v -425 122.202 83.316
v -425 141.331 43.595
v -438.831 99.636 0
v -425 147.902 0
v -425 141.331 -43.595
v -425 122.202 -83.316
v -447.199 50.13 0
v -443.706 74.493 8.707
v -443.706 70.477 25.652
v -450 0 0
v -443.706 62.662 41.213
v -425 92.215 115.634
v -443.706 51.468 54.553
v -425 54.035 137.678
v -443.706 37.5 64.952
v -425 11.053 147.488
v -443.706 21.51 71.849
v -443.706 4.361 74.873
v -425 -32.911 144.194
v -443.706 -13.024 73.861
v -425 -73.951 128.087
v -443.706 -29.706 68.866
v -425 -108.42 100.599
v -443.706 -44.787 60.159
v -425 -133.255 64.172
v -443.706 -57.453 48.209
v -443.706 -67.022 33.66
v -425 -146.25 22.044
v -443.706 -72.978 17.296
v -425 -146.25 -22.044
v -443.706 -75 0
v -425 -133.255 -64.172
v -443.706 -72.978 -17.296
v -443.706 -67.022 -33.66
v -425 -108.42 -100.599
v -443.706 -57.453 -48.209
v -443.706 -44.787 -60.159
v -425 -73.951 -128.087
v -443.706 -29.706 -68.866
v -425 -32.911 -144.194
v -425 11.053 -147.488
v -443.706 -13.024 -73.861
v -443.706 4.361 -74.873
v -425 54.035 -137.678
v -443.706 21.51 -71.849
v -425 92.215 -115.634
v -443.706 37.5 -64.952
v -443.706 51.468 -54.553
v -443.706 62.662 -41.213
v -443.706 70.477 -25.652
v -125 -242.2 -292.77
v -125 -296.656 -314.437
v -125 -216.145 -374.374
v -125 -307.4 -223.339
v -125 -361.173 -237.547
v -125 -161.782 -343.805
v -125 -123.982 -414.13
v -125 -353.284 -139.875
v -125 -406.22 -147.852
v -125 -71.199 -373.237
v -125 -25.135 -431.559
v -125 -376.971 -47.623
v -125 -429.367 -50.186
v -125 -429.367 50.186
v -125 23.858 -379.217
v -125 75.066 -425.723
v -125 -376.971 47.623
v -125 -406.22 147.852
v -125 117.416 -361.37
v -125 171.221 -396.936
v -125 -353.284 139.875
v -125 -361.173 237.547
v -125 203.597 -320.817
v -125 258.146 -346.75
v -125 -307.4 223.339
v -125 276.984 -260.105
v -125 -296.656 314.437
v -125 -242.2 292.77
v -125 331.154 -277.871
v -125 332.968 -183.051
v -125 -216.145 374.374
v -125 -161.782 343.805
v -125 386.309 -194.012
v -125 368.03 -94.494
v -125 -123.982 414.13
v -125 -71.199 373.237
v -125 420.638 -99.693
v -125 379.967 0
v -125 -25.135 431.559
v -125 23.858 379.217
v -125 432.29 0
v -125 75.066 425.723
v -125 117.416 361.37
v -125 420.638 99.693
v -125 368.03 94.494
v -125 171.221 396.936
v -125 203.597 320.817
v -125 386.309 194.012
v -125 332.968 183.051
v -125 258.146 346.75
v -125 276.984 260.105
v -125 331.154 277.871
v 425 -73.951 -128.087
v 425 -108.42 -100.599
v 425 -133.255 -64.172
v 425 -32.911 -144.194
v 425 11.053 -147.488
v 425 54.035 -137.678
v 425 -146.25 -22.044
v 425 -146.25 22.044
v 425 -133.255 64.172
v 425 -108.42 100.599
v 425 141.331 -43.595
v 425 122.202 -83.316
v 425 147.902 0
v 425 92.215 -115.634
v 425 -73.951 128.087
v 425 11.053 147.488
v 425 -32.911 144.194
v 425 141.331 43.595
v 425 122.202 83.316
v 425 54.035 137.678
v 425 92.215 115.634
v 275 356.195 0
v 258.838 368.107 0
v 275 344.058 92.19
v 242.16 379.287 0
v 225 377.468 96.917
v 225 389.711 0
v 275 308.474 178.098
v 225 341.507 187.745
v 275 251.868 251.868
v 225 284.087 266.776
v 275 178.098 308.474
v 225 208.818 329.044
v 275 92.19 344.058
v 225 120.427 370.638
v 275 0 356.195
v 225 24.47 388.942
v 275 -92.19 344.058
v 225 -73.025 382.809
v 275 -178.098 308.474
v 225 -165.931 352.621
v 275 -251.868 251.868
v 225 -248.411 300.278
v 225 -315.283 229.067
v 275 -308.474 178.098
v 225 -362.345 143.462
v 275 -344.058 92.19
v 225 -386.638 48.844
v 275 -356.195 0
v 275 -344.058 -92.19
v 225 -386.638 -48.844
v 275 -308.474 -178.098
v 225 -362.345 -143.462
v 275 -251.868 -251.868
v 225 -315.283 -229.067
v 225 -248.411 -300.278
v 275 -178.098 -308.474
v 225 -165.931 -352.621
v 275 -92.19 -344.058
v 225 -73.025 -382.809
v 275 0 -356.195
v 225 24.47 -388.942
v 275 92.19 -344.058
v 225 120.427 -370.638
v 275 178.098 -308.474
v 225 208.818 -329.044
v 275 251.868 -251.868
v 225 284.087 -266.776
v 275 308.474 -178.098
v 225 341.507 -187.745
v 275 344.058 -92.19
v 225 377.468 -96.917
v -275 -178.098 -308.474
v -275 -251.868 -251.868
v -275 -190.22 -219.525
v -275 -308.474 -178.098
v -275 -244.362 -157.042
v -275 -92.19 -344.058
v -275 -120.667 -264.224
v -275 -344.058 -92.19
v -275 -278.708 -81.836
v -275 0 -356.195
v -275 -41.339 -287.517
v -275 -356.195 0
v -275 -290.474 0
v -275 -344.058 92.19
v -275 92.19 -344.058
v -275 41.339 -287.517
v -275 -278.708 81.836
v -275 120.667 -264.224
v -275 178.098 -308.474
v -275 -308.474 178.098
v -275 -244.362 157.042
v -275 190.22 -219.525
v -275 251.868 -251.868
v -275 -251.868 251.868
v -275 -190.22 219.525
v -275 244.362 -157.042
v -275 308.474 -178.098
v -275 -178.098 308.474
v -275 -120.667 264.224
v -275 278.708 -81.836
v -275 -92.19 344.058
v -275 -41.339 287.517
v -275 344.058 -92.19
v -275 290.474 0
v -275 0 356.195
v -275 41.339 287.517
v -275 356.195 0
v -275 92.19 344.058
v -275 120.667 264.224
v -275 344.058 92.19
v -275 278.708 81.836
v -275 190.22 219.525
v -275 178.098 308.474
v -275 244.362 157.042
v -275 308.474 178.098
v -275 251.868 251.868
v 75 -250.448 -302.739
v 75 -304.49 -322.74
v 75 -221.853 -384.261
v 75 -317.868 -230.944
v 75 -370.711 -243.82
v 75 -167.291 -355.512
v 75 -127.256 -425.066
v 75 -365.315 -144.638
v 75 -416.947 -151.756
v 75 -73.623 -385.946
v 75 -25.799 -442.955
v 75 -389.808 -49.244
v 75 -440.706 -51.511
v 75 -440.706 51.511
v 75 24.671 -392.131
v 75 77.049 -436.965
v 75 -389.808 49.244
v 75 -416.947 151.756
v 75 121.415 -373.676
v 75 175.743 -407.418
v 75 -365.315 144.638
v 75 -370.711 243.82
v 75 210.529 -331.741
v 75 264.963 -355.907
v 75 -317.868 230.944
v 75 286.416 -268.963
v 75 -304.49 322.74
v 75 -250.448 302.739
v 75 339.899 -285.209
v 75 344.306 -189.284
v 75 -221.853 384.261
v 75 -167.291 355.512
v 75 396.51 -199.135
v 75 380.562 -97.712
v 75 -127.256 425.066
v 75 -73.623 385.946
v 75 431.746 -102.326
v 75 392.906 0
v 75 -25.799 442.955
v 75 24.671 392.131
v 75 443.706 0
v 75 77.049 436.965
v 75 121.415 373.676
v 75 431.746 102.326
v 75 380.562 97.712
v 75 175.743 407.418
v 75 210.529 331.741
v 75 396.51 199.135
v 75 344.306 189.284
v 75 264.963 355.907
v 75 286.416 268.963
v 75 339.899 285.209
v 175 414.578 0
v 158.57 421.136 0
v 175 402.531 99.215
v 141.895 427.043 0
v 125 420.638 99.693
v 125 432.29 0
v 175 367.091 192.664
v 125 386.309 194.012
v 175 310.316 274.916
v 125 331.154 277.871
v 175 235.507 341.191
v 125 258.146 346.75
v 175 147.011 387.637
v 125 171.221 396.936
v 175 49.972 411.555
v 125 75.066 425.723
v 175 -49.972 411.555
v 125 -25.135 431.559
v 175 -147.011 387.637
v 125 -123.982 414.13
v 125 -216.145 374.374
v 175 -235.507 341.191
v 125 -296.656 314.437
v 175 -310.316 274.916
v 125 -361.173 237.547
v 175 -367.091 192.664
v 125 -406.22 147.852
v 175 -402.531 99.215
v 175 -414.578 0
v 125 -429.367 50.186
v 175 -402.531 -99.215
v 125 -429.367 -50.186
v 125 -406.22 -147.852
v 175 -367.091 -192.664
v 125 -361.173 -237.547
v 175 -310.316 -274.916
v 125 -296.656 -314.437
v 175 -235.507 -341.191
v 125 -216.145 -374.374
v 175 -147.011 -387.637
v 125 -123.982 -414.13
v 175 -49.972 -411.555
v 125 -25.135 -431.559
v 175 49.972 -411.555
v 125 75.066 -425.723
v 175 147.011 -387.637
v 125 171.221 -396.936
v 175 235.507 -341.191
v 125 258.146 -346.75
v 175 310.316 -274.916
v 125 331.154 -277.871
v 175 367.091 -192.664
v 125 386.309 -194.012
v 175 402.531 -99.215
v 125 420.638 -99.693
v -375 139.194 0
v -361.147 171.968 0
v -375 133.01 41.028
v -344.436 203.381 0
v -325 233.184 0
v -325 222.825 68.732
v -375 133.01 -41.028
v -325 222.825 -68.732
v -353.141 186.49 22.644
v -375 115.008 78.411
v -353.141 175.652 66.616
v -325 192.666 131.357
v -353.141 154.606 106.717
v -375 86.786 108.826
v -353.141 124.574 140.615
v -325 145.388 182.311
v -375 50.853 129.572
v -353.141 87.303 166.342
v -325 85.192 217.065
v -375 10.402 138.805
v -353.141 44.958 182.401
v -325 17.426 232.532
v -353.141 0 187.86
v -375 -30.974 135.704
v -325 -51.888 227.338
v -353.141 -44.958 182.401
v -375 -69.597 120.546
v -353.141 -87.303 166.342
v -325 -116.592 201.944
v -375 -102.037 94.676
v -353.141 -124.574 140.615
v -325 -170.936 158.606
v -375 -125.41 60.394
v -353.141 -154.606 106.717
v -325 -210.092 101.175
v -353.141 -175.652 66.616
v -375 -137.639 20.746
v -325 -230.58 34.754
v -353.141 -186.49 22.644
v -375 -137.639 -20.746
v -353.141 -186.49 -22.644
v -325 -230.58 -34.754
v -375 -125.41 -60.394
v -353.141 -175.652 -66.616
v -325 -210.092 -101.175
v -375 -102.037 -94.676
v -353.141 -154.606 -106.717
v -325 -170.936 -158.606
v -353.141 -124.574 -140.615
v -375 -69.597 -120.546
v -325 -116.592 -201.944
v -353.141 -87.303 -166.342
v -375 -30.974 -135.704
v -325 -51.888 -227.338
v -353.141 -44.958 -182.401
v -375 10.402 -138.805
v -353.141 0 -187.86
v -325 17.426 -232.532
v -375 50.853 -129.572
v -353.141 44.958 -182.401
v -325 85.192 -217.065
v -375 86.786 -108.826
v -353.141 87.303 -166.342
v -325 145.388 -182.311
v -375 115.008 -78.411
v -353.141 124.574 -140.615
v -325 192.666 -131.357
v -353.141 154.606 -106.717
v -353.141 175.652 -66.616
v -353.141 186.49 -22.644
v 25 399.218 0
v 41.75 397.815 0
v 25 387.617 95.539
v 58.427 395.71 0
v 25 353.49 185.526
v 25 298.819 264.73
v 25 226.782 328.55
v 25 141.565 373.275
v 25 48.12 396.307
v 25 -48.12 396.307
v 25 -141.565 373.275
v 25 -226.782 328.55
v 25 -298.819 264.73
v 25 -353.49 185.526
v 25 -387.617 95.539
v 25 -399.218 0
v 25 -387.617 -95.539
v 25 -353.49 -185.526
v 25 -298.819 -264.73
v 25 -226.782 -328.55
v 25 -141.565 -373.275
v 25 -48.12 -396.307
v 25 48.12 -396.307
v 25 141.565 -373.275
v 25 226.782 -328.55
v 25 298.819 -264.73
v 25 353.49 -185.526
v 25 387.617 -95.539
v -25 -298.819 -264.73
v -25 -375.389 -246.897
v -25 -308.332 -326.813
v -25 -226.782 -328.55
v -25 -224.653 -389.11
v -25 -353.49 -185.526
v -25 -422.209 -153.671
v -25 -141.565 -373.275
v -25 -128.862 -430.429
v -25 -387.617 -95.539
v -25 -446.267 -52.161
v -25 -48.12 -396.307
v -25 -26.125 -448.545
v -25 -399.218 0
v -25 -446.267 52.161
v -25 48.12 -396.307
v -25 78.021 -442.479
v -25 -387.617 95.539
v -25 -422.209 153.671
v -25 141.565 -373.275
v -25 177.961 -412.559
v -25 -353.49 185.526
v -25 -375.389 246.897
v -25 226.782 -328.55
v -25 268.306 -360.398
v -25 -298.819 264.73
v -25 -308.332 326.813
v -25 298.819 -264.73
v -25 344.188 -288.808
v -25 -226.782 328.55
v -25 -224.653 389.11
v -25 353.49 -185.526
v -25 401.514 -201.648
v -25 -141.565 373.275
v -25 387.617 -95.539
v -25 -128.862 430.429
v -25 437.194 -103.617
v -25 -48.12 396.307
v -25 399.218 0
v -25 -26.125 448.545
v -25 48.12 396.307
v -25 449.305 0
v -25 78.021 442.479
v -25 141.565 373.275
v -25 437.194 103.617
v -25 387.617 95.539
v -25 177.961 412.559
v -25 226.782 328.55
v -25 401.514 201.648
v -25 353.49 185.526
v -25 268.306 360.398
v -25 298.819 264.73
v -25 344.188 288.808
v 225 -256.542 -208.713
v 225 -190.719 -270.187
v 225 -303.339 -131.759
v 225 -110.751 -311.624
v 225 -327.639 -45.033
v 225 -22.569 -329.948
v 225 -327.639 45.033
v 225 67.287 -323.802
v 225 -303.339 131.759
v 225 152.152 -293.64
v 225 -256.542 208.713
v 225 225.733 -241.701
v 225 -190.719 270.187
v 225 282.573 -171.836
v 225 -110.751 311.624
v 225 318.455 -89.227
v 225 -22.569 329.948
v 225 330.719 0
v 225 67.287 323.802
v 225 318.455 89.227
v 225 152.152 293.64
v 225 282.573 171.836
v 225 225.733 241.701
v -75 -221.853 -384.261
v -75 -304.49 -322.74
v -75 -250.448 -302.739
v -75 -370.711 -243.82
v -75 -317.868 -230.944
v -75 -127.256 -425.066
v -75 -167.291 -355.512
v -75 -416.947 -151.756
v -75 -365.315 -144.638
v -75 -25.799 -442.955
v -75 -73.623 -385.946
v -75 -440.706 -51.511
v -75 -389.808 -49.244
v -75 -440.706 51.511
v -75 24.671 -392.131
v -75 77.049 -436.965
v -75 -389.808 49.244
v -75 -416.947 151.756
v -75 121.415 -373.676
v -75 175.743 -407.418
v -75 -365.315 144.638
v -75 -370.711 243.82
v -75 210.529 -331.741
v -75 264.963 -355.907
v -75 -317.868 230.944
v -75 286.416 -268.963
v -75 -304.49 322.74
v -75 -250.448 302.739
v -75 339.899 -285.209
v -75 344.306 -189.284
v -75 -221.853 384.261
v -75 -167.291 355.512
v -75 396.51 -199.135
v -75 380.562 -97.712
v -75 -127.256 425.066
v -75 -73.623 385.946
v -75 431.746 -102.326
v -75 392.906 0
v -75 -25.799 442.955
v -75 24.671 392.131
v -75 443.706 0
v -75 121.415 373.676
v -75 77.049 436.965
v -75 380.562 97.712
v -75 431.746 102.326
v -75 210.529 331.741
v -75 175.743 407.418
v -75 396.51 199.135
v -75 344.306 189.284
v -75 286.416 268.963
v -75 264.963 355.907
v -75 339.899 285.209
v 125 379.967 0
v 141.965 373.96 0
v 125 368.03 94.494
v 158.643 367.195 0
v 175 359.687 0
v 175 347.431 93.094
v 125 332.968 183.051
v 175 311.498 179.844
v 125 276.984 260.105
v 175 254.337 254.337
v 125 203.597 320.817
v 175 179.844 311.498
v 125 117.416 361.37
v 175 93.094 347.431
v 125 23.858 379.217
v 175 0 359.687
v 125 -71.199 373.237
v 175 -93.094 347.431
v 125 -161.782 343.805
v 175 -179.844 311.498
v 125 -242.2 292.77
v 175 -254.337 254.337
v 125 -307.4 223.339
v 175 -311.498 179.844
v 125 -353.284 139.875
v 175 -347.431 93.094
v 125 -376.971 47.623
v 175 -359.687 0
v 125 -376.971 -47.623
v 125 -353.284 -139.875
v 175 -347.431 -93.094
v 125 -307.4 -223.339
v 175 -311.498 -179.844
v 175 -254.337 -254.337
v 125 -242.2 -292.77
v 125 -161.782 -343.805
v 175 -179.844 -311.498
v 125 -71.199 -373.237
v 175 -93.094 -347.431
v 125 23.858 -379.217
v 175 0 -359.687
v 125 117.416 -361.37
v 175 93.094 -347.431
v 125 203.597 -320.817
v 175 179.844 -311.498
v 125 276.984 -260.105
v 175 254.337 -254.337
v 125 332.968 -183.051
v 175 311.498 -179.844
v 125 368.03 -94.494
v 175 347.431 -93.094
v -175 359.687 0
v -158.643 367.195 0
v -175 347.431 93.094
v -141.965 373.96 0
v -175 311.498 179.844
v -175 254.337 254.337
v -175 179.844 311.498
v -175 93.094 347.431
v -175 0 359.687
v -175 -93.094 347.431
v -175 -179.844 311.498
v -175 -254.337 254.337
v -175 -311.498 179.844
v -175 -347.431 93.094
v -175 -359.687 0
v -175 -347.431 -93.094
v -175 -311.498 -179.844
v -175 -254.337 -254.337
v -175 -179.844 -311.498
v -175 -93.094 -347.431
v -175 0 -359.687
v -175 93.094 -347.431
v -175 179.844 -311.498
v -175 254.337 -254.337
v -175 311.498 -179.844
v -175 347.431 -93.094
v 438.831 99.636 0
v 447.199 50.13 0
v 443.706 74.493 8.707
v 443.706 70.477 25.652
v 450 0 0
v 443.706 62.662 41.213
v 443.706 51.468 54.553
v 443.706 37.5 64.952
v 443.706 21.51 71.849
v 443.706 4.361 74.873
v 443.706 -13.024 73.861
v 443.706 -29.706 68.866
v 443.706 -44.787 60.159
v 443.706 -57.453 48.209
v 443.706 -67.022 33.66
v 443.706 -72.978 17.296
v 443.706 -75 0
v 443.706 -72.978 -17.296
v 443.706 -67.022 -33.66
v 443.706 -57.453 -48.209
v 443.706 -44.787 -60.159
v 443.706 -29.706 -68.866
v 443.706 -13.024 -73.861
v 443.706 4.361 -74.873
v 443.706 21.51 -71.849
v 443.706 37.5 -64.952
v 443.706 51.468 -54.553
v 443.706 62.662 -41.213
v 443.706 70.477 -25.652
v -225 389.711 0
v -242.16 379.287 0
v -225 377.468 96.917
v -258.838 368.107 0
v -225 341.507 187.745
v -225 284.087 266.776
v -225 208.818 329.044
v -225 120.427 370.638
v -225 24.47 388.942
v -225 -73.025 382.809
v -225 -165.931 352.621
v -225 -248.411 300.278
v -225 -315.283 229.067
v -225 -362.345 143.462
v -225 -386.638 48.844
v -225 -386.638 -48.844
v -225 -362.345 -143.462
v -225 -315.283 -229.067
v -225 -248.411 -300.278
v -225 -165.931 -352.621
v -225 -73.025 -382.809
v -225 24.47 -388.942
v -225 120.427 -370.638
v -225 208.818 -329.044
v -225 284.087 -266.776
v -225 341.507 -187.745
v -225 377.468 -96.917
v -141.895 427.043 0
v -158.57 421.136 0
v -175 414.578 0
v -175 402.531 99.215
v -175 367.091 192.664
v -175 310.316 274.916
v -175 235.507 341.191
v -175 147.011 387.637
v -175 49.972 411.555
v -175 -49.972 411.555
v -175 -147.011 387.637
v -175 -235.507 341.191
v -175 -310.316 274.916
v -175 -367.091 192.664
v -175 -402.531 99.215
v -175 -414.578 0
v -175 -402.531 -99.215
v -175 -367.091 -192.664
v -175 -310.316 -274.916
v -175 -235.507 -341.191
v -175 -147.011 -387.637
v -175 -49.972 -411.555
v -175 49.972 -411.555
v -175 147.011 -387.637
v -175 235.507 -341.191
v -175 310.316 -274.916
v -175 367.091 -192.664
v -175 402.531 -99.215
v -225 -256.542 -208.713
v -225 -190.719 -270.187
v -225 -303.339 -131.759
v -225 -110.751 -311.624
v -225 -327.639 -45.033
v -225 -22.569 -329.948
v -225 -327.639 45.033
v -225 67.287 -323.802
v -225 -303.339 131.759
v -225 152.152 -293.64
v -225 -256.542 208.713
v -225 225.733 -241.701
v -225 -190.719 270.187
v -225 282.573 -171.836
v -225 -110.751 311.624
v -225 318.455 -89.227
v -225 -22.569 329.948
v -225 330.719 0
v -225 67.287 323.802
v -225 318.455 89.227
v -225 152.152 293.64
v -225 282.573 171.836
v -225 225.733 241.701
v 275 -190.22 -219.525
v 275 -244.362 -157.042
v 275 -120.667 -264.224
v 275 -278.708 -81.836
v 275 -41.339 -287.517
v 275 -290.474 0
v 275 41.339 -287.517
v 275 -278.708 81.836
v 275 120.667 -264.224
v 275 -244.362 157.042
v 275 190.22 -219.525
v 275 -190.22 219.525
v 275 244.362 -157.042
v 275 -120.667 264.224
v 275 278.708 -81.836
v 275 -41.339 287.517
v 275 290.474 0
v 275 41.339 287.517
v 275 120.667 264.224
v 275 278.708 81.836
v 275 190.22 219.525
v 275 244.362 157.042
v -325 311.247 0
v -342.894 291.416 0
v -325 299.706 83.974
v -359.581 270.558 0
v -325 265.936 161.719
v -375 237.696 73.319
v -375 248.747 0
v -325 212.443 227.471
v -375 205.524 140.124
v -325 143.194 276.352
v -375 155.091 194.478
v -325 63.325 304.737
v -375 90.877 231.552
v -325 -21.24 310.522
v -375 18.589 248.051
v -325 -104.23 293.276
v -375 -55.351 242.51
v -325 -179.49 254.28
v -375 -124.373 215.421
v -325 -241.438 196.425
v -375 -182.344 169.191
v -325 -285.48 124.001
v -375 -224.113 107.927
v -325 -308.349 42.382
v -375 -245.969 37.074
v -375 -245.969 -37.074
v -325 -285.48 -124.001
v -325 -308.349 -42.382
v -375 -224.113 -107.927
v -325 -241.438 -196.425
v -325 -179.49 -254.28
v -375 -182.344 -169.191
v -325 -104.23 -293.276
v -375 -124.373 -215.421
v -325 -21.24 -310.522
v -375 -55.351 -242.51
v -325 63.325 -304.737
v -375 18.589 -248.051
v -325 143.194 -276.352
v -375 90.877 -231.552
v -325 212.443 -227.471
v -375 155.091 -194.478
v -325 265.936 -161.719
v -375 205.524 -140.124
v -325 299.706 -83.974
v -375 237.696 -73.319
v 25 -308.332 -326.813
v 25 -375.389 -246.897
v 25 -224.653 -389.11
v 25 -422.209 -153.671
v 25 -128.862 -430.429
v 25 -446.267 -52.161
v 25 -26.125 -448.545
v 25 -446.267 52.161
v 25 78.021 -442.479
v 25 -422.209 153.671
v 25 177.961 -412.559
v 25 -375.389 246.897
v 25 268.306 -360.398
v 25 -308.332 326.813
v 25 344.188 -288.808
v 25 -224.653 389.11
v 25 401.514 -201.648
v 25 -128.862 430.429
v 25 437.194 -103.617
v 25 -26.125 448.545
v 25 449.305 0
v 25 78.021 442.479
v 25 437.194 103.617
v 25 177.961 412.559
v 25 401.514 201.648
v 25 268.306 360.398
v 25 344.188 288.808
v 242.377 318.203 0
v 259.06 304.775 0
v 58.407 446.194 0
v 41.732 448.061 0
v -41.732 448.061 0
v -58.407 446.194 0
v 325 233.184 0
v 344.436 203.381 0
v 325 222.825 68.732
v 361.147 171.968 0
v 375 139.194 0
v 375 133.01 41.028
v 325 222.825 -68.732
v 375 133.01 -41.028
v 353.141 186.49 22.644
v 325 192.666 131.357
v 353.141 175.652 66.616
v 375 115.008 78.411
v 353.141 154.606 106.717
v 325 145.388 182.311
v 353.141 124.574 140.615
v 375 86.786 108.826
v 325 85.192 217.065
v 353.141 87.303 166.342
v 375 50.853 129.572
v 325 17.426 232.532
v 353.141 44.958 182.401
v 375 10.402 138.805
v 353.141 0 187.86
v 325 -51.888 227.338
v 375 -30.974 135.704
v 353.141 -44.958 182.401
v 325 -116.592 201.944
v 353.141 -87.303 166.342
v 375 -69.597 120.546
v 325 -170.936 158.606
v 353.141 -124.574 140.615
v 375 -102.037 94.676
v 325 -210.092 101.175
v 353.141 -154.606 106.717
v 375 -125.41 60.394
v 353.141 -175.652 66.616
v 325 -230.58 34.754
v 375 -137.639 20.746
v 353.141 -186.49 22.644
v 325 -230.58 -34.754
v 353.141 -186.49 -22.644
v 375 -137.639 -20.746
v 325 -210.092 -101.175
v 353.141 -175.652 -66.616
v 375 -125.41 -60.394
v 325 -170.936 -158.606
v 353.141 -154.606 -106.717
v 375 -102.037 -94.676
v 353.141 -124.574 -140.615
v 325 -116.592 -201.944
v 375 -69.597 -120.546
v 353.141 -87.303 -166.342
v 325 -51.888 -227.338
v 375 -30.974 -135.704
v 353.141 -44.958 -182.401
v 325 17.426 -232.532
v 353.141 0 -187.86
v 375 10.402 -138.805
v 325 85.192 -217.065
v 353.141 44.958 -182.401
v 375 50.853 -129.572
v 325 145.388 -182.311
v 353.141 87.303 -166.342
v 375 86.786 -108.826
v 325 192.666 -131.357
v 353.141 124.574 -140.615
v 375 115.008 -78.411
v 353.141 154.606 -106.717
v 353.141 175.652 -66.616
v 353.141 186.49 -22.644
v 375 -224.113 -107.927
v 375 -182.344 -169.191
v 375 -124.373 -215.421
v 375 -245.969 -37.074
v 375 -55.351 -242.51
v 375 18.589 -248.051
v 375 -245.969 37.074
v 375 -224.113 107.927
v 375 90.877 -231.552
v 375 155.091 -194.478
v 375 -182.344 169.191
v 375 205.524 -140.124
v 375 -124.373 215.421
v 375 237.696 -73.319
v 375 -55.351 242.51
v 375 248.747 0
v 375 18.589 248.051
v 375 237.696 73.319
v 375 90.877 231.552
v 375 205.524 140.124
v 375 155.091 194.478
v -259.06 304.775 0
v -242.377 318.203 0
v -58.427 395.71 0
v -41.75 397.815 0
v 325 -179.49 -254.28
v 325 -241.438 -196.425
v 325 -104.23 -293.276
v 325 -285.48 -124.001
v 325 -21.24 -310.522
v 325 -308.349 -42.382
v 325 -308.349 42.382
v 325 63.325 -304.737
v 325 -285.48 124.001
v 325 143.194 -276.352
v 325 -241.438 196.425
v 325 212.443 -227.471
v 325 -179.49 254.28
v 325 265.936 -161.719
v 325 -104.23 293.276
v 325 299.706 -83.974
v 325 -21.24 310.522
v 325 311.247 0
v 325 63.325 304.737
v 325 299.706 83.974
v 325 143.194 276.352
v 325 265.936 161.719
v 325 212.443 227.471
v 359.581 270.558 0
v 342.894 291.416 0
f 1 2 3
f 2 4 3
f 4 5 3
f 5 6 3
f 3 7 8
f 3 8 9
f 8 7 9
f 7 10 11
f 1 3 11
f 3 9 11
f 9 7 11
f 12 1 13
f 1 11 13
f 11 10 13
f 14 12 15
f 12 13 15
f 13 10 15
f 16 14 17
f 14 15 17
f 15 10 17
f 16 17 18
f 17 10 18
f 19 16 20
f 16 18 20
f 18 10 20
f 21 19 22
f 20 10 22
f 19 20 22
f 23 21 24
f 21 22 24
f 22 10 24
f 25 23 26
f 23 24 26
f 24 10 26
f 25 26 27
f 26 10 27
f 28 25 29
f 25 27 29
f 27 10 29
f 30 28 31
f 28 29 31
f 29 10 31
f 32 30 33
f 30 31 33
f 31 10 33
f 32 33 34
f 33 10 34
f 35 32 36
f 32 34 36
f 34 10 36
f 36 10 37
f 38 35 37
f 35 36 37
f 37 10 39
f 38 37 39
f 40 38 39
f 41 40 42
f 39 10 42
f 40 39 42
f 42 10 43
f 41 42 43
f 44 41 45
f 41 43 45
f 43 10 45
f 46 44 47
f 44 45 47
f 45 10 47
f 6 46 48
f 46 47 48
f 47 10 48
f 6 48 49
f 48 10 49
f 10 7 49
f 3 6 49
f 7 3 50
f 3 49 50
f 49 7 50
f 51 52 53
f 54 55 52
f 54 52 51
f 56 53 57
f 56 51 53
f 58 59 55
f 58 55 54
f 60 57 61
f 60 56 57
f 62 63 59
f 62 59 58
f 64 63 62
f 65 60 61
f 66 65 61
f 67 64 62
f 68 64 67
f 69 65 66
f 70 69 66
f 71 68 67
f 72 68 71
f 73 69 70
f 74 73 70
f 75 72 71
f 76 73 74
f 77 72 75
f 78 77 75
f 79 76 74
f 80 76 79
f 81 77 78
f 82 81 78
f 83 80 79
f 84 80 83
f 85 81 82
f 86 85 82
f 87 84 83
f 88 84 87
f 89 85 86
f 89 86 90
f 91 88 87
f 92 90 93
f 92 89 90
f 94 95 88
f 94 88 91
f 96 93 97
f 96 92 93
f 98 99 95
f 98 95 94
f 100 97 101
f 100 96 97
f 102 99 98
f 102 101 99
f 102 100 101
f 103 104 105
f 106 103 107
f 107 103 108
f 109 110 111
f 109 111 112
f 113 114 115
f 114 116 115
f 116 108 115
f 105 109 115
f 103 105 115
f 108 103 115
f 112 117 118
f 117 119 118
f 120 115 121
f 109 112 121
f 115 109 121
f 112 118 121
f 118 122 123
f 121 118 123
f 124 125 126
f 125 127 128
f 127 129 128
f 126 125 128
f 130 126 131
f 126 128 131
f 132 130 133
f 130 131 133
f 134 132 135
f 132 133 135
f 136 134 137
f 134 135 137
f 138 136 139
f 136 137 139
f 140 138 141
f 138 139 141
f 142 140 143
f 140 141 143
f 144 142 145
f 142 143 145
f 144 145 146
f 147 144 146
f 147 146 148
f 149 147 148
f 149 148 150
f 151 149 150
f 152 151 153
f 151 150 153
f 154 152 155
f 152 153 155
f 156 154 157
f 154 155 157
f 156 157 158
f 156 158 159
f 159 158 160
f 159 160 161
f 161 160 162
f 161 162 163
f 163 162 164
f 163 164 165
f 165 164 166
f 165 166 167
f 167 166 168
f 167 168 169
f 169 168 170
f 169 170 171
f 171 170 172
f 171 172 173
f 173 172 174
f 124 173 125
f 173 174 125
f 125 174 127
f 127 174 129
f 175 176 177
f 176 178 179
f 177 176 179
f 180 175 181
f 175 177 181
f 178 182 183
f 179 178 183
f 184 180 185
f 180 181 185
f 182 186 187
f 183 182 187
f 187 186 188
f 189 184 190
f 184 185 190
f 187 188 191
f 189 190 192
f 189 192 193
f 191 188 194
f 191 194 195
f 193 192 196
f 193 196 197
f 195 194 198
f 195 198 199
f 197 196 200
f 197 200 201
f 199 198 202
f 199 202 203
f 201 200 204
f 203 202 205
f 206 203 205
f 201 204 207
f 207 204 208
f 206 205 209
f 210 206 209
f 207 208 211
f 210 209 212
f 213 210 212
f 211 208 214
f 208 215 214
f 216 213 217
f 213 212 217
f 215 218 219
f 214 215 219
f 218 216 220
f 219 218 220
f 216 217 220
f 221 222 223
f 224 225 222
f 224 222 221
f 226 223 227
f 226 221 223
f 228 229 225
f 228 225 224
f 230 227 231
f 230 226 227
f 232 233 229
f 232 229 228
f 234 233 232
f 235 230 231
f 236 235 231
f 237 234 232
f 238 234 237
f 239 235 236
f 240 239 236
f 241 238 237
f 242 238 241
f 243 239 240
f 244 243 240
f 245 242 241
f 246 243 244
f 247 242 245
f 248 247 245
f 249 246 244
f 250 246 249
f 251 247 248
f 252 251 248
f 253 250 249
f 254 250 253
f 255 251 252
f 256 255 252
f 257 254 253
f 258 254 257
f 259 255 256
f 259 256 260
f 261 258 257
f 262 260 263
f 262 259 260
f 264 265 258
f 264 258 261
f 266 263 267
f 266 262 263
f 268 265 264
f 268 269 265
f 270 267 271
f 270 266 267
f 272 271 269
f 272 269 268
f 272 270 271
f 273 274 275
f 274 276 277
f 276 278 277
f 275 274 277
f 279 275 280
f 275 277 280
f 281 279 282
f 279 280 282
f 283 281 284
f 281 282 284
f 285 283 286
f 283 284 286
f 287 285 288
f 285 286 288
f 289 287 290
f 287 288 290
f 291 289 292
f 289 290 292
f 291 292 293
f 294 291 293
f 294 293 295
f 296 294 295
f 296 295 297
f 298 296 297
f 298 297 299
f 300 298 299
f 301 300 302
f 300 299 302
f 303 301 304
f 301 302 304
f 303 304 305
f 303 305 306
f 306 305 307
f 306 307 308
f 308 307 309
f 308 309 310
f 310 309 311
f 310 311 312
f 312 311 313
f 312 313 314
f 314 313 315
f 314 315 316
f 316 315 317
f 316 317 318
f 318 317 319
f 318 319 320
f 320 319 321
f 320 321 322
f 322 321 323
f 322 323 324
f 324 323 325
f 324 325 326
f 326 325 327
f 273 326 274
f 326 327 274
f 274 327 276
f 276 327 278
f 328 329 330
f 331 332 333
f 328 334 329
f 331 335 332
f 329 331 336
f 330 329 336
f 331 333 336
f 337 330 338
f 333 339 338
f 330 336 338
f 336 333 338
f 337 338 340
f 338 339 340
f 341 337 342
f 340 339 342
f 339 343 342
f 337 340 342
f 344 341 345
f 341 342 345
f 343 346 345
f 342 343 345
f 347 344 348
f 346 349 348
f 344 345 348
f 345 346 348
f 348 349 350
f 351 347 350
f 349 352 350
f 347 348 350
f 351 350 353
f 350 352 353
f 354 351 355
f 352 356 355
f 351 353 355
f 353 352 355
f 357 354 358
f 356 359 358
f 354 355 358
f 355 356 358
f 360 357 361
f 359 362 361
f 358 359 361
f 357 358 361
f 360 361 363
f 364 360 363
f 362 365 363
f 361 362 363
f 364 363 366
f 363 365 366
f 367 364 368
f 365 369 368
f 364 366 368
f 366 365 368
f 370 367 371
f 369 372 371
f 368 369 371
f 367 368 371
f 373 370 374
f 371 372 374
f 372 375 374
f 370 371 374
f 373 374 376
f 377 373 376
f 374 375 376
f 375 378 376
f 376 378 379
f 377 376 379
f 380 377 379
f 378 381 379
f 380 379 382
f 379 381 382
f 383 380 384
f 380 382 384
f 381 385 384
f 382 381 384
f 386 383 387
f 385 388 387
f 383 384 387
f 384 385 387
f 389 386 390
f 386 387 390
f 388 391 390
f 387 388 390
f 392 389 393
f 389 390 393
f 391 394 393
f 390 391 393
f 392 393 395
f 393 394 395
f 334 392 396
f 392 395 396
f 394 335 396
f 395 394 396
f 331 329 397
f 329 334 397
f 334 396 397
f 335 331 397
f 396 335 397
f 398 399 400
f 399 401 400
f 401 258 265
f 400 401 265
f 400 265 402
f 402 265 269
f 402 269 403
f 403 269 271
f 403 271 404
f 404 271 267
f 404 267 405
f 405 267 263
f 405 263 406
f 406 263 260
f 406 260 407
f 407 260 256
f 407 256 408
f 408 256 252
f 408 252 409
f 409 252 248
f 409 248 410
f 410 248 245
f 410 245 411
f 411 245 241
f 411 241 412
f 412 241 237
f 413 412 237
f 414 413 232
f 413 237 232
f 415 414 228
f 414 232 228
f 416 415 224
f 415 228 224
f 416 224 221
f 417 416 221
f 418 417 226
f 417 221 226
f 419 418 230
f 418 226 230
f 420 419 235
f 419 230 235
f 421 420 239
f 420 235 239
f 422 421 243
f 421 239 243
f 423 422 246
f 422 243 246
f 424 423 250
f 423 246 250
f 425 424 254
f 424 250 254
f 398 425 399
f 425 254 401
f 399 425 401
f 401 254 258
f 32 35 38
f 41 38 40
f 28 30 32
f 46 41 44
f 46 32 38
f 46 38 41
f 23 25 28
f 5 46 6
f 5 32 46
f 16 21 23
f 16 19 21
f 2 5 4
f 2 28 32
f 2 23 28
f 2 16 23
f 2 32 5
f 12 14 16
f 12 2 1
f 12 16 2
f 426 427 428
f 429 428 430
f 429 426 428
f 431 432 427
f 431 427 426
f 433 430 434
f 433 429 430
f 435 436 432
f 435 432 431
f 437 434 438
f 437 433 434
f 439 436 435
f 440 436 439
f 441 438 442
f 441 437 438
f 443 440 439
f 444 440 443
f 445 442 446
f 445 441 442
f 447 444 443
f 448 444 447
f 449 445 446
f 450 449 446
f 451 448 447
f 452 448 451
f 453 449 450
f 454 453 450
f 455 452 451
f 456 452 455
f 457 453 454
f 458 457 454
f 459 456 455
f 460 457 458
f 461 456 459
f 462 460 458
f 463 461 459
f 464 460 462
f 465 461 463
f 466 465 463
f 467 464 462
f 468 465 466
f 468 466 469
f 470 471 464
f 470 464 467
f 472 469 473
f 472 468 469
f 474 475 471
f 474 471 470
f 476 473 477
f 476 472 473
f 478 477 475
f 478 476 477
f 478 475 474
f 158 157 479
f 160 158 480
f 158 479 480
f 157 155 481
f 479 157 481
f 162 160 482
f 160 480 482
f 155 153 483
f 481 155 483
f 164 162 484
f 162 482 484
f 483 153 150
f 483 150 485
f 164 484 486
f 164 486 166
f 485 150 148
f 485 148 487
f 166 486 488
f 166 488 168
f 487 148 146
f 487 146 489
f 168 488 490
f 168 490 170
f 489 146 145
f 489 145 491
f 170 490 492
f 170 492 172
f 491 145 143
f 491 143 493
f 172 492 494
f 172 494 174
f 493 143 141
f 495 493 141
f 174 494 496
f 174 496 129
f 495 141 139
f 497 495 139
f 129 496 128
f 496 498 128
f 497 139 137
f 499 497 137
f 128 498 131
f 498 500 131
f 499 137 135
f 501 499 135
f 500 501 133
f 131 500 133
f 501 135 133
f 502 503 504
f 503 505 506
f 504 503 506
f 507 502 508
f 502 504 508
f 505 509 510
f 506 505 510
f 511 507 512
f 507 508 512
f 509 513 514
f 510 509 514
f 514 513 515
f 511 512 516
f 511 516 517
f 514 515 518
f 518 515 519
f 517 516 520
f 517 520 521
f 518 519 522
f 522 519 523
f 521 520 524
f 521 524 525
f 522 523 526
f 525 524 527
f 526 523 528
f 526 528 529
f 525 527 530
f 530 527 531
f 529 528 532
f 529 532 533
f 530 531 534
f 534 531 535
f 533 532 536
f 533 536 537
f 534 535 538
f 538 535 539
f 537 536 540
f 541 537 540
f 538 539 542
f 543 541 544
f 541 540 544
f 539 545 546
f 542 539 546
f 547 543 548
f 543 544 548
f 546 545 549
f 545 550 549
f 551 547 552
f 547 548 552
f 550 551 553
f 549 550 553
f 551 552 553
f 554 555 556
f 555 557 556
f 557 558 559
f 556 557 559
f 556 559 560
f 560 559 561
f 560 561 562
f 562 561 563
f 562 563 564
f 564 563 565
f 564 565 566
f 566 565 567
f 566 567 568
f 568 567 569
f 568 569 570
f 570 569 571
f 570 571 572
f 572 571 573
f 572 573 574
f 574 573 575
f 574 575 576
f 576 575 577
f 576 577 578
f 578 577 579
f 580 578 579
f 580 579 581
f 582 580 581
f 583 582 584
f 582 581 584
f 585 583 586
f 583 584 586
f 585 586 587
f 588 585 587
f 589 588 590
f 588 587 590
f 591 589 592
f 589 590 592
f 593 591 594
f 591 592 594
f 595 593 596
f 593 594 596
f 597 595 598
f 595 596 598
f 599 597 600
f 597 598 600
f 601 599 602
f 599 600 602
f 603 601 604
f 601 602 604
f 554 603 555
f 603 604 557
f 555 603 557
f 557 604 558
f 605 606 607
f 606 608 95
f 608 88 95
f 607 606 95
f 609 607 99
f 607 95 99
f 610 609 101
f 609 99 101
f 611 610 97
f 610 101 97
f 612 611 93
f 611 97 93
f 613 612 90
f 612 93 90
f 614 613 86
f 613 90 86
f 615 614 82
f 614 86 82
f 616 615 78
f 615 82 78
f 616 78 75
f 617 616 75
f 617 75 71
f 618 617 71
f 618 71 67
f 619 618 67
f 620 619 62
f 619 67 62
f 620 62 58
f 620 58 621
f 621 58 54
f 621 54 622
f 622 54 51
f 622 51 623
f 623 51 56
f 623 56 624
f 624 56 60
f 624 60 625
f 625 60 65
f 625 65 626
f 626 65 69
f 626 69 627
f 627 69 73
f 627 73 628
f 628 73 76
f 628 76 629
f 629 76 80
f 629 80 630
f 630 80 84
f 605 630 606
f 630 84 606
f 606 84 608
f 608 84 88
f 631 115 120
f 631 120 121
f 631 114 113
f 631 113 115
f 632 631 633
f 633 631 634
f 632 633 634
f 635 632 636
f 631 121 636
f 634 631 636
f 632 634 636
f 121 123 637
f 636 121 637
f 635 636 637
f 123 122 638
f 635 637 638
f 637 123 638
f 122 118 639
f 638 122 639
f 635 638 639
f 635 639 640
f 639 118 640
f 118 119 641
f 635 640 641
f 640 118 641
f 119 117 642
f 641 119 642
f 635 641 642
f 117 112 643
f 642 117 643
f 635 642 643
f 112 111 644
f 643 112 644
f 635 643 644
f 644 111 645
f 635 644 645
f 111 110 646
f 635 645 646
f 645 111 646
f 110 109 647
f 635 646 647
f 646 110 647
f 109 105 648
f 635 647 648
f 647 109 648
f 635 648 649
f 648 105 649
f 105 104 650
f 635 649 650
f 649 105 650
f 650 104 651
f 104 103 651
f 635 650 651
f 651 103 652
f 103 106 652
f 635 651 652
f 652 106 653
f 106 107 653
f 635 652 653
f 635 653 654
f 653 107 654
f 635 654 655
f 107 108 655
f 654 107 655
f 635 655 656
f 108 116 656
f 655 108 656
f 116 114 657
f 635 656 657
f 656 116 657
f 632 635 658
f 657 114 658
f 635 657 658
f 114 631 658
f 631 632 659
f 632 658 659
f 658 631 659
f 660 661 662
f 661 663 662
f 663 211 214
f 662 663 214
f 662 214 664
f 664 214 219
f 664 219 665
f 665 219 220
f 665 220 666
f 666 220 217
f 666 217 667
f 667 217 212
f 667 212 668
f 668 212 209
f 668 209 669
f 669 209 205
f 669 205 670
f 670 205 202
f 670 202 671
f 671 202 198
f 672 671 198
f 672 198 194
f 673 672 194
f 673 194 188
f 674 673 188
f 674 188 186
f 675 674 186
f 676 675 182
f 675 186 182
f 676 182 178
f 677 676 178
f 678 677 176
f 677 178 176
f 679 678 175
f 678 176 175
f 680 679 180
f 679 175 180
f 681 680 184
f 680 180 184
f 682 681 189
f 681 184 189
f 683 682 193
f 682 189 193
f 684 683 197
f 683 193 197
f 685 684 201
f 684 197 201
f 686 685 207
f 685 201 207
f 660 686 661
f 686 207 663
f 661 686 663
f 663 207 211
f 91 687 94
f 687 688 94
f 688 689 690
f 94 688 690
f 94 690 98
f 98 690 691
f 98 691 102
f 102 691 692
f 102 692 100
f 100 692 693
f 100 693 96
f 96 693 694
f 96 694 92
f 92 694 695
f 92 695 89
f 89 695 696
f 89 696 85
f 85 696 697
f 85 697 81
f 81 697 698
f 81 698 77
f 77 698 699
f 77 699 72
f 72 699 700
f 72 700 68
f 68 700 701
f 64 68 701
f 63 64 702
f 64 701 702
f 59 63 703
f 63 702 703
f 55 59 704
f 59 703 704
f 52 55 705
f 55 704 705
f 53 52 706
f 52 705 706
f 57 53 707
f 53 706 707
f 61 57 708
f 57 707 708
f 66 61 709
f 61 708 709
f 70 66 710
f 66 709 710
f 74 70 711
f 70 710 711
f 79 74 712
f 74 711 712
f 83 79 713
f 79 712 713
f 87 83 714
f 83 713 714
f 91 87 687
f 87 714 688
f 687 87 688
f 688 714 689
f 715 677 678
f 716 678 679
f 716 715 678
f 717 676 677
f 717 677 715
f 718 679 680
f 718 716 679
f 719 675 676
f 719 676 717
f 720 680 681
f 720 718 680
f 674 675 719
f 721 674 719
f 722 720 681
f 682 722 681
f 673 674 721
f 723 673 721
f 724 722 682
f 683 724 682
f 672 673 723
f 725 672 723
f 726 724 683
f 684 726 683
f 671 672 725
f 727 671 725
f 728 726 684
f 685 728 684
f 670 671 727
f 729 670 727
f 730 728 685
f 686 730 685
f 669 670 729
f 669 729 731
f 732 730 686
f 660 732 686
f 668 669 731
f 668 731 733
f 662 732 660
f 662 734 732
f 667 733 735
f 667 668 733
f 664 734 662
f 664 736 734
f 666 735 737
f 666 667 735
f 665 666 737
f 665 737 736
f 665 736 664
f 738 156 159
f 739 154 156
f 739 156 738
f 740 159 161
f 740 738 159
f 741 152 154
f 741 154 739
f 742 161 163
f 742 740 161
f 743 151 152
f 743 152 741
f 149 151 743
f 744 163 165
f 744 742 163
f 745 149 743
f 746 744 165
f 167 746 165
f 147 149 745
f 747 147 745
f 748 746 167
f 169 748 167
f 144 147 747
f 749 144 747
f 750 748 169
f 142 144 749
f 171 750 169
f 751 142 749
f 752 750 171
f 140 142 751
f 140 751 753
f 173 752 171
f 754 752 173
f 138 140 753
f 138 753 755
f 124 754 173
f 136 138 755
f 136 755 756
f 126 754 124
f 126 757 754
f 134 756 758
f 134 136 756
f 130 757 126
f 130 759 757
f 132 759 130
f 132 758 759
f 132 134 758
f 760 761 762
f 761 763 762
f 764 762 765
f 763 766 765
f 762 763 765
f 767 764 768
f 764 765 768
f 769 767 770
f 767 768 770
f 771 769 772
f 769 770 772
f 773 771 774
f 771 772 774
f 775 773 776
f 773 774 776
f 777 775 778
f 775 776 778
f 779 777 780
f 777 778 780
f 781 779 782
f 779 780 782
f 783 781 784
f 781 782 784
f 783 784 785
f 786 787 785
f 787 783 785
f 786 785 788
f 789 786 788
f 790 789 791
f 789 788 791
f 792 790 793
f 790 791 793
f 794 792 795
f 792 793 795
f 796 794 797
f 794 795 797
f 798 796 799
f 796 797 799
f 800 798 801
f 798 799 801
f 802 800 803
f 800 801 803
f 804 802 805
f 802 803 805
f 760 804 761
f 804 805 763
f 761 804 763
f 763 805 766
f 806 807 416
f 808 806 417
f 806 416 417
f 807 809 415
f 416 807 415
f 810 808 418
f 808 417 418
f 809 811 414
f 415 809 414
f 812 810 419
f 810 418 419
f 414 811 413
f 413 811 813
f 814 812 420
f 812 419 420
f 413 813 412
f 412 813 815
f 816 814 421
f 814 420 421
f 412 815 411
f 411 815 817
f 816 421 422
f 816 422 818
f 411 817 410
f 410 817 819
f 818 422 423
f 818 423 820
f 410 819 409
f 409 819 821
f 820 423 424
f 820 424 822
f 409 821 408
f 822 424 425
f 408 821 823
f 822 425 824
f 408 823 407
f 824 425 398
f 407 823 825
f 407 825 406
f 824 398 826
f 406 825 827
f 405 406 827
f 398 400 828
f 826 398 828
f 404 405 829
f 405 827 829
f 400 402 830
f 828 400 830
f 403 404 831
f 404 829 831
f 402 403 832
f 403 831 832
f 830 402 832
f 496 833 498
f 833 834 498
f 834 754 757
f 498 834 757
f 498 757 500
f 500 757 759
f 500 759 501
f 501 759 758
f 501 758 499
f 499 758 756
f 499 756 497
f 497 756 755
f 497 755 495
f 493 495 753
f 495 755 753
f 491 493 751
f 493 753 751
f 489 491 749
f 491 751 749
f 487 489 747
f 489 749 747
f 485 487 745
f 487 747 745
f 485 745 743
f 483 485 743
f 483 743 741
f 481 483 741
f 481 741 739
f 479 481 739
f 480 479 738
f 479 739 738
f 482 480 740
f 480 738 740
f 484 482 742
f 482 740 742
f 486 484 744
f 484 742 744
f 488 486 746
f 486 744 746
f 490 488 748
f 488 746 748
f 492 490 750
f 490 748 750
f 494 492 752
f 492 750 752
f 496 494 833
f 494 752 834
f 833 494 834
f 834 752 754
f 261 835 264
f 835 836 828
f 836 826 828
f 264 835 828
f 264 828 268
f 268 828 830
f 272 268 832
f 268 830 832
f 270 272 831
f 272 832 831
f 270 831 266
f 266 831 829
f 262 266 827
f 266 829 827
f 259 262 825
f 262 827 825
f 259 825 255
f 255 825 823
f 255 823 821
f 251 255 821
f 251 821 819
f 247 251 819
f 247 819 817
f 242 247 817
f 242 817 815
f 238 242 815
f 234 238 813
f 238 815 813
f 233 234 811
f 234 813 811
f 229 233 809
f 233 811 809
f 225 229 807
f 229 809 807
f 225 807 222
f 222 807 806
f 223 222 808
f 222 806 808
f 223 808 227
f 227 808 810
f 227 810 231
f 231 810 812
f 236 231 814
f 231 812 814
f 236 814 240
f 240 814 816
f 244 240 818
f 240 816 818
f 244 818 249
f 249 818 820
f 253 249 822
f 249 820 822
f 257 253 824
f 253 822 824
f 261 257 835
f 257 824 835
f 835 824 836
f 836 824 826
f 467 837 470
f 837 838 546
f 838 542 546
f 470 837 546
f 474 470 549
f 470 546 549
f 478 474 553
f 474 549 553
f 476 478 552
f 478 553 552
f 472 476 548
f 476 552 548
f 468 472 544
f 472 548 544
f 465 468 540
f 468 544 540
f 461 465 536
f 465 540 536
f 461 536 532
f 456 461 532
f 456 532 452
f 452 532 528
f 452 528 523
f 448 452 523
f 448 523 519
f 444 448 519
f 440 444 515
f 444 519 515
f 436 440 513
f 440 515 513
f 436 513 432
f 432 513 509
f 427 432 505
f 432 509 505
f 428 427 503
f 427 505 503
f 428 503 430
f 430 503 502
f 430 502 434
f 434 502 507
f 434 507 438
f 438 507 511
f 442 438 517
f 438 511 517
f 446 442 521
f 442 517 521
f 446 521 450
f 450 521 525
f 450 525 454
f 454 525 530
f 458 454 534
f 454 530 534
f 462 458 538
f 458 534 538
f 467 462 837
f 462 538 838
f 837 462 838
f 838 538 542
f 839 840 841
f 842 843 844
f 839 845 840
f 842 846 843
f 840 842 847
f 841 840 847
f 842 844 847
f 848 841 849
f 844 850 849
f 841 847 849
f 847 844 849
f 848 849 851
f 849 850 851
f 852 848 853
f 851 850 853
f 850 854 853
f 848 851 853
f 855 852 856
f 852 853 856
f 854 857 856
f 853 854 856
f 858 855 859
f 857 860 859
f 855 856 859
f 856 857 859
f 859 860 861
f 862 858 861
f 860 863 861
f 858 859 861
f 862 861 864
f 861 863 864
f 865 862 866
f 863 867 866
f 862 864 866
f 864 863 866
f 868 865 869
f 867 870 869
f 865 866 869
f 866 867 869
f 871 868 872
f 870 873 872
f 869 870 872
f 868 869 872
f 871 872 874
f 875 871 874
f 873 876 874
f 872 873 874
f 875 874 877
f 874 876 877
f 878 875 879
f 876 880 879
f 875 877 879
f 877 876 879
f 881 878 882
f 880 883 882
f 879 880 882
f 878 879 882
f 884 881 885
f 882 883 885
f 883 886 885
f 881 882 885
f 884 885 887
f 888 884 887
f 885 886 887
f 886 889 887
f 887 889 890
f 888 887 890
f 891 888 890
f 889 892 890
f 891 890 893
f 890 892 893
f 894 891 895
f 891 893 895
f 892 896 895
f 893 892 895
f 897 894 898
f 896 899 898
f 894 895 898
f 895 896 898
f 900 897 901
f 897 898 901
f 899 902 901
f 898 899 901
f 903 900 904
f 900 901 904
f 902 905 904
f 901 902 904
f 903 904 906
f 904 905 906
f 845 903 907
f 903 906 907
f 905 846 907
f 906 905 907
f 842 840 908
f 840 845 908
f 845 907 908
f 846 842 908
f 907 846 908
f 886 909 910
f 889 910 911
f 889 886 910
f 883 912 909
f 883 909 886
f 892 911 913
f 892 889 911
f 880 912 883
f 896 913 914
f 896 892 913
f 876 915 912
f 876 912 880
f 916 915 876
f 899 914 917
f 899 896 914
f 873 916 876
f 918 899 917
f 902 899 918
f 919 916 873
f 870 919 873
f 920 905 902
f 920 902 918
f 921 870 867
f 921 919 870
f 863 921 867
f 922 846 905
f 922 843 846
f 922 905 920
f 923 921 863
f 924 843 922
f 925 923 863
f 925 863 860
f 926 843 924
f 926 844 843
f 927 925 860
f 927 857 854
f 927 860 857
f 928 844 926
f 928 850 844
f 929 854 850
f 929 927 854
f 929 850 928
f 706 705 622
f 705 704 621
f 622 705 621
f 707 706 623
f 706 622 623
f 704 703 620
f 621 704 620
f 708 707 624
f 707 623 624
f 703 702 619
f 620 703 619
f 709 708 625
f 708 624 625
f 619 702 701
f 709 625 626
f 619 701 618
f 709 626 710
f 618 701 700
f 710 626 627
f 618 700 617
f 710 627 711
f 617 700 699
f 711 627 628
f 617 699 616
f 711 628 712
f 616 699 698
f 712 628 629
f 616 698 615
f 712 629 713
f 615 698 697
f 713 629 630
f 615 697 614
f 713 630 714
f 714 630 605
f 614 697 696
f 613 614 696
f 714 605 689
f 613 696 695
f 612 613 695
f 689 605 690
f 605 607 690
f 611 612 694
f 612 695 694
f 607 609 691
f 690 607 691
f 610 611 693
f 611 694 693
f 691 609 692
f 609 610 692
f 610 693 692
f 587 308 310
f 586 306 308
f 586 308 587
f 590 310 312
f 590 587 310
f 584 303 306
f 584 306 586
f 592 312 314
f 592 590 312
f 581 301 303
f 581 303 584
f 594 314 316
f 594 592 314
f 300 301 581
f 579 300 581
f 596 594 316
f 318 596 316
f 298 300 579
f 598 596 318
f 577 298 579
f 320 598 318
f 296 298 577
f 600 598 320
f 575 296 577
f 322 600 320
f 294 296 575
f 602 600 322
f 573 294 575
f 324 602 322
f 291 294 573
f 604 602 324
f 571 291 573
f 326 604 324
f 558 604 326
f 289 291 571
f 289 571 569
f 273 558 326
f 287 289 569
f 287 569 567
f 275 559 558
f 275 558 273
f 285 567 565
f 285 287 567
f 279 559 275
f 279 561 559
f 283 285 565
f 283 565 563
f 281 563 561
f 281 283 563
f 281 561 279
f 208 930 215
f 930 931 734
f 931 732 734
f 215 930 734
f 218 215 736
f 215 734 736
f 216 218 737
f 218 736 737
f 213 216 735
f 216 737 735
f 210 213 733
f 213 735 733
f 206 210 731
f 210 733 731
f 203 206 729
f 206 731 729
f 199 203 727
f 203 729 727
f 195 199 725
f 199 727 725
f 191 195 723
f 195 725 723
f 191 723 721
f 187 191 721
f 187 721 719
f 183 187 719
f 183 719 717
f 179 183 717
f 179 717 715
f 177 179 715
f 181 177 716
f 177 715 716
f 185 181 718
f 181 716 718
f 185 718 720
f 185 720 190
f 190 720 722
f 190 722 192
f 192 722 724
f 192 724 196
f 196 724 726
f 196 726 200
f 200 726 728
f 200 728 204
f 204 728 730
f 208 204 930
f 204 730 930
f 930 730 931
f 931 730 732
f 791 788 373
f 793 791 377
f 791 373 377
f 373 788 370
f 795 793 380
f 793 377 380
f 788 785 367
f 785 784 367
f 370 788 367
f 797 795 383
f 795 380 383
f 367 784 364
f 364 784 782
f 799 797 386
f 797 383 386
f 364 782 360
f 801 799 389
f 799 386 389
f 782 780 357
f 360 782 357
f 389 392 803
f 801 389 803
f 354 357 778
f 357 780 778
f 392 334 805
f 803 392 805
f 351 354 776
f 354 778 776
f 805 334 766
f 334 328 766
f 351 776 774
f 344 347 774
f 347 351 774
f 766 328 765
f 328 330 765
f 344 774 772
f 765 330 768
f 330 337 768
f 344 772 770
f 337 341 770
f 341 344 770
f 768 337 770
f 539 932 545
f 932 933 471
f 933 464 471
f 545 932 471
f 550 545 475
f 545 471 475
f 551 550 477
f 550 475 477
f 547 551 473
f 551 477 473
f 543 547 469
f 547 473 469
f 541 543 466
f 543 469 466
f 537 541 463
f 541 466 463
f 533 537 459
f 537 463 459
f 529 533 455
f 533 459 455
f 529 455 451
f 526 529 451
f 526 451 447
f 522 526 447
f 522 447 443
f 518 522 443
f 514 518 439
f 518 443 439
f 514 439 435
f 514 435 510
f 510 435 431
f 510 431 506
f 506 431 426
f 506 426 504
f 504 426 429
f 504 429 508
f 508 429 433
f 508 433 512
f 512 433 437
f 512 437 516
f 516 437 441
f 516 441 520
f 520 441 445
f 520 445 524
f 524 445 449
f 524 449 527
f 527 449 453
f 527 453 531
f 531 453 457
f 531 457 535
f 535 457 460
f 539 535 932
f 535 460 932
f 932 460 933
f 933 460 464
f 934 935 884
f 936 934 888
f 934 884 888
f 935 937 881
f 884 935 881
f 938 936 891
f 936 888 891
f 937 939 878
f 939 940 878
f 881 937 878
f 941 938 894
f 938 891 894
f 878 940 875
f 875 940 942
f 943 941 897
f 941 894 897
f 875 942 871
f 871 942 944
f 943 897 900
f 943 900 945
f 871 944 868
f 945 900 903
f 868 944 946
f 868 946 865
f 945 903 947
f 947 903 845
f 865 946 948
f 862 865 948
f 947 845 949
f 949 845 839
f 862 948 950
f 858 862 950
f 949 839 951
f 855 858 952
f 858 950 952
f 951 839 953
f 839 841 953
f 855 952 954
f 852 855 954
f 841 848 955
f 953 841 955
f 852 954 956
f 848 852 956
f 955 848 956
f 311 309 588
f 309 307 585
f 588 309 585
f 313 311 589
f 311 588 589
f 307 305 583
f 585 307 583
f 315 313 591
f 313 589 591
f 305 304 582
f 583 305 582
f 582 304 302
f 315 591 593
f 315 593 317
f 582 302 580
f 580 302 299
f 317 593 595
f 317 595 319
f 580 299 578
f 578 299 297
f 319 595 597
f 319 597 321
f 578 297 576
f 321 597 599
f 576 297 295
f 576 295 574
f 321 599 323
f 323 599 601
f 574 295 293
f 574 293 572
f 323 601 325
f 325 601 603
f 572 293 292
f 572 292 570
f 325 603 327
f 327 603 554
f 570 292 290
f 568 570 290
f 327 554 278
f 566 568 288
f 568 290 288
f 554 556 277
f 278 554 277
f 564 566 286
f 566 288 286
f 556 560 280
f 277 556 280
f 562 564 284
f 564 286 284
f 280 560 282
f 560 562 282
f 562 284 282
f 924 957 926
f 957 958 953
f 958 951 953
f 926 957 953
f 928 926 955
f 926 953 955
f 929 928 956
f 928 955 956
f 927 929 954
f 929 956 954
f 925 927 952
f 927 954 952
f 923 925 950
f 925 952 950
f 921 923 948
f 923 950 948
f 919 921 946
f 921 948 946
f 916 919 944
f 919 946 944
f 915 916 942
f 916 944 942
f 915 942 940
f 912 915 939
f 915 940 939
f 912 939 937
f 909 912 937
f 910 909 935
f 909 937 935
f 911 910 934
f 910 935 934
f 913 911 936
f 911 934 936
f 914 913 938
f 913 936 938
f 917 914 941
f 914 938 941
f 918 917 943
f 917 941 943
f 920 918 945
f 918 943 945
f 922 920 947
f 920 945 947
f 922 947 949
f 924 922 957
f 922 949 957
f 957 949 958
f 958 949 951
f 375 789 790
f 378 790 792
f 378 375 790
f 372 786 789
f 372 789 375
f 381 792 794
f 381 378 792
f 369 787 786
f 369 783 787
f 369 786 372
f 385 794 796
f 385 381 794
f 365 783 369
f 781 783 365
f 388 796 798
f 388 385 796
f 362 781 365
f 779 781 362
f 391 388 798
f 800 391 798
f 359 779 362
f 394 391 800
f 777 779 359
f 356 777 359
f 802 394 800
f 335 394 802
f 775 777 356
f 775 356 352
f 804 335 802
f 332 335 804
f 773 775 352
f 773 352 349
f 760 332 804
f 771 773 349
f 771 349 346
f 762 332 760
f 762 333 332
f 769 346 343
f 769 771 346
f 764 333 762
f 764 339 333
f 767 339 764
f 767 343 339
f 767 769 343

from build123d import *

# Parameters (mm, degrees)
SKETCH2_W           = 50
SKETCH2_H           = 976.29030082
CUT_EXTRUDE1_DEPTH  = 451
LPATTERN1_COUNT     = 5
LPATTERN1_PITCH     = 100
LPATTERN1_COL_COUNT = 5
LPATTERN1_COL_PITCH = 100


with BuildPart() as part:
    # Sketch1 → Revolve2 (revolve)
    with BuildSketch(Plane.XY):
        with BuildLine():
            Line((-450, 0), (-400, 0))
            ThreePointArc((-400, 0), (0, 400), (400, 0))
            Line((400, 0), (450, 0))
            ThreePointArc((450, 0), (0, 450), (-450, 0))
        make_face()
    revolve(axis=Axis((-450, 0, 0), (1, 0, 0)))

    # Sketch2 → Cut-Extrude1 (cut, symmetric)
    with BuildSketch(Plane.XY):
        Rectangle(SKETCH2_W, SKETCH2_H)
    cut_extrude1 = extrude(amount=CUT_EXTRUDE1_DEPTH, both=True, mode=Mode.SUBTRACT)

    # LPattern1: Cut-Extrude1 ×5
    with Locations(*[(-i * LPATTERN1_PITCH, 0, 0) for i in range(1, LPATTERN1_COUNT)]):
        add(cut_extrude1, mode=Mode.SUBTRACT)

    # LPattern1 col: Cut-Extrude1 ×5
    with Locations(*[(i * LPATTERN1_COL_PITCH, 0, 0) for i in range(1, LPATTERN1_COL_COUNT)]):
        add(cut_extrude1, mode=Mode.SUBTRACT)


solid = part.part
